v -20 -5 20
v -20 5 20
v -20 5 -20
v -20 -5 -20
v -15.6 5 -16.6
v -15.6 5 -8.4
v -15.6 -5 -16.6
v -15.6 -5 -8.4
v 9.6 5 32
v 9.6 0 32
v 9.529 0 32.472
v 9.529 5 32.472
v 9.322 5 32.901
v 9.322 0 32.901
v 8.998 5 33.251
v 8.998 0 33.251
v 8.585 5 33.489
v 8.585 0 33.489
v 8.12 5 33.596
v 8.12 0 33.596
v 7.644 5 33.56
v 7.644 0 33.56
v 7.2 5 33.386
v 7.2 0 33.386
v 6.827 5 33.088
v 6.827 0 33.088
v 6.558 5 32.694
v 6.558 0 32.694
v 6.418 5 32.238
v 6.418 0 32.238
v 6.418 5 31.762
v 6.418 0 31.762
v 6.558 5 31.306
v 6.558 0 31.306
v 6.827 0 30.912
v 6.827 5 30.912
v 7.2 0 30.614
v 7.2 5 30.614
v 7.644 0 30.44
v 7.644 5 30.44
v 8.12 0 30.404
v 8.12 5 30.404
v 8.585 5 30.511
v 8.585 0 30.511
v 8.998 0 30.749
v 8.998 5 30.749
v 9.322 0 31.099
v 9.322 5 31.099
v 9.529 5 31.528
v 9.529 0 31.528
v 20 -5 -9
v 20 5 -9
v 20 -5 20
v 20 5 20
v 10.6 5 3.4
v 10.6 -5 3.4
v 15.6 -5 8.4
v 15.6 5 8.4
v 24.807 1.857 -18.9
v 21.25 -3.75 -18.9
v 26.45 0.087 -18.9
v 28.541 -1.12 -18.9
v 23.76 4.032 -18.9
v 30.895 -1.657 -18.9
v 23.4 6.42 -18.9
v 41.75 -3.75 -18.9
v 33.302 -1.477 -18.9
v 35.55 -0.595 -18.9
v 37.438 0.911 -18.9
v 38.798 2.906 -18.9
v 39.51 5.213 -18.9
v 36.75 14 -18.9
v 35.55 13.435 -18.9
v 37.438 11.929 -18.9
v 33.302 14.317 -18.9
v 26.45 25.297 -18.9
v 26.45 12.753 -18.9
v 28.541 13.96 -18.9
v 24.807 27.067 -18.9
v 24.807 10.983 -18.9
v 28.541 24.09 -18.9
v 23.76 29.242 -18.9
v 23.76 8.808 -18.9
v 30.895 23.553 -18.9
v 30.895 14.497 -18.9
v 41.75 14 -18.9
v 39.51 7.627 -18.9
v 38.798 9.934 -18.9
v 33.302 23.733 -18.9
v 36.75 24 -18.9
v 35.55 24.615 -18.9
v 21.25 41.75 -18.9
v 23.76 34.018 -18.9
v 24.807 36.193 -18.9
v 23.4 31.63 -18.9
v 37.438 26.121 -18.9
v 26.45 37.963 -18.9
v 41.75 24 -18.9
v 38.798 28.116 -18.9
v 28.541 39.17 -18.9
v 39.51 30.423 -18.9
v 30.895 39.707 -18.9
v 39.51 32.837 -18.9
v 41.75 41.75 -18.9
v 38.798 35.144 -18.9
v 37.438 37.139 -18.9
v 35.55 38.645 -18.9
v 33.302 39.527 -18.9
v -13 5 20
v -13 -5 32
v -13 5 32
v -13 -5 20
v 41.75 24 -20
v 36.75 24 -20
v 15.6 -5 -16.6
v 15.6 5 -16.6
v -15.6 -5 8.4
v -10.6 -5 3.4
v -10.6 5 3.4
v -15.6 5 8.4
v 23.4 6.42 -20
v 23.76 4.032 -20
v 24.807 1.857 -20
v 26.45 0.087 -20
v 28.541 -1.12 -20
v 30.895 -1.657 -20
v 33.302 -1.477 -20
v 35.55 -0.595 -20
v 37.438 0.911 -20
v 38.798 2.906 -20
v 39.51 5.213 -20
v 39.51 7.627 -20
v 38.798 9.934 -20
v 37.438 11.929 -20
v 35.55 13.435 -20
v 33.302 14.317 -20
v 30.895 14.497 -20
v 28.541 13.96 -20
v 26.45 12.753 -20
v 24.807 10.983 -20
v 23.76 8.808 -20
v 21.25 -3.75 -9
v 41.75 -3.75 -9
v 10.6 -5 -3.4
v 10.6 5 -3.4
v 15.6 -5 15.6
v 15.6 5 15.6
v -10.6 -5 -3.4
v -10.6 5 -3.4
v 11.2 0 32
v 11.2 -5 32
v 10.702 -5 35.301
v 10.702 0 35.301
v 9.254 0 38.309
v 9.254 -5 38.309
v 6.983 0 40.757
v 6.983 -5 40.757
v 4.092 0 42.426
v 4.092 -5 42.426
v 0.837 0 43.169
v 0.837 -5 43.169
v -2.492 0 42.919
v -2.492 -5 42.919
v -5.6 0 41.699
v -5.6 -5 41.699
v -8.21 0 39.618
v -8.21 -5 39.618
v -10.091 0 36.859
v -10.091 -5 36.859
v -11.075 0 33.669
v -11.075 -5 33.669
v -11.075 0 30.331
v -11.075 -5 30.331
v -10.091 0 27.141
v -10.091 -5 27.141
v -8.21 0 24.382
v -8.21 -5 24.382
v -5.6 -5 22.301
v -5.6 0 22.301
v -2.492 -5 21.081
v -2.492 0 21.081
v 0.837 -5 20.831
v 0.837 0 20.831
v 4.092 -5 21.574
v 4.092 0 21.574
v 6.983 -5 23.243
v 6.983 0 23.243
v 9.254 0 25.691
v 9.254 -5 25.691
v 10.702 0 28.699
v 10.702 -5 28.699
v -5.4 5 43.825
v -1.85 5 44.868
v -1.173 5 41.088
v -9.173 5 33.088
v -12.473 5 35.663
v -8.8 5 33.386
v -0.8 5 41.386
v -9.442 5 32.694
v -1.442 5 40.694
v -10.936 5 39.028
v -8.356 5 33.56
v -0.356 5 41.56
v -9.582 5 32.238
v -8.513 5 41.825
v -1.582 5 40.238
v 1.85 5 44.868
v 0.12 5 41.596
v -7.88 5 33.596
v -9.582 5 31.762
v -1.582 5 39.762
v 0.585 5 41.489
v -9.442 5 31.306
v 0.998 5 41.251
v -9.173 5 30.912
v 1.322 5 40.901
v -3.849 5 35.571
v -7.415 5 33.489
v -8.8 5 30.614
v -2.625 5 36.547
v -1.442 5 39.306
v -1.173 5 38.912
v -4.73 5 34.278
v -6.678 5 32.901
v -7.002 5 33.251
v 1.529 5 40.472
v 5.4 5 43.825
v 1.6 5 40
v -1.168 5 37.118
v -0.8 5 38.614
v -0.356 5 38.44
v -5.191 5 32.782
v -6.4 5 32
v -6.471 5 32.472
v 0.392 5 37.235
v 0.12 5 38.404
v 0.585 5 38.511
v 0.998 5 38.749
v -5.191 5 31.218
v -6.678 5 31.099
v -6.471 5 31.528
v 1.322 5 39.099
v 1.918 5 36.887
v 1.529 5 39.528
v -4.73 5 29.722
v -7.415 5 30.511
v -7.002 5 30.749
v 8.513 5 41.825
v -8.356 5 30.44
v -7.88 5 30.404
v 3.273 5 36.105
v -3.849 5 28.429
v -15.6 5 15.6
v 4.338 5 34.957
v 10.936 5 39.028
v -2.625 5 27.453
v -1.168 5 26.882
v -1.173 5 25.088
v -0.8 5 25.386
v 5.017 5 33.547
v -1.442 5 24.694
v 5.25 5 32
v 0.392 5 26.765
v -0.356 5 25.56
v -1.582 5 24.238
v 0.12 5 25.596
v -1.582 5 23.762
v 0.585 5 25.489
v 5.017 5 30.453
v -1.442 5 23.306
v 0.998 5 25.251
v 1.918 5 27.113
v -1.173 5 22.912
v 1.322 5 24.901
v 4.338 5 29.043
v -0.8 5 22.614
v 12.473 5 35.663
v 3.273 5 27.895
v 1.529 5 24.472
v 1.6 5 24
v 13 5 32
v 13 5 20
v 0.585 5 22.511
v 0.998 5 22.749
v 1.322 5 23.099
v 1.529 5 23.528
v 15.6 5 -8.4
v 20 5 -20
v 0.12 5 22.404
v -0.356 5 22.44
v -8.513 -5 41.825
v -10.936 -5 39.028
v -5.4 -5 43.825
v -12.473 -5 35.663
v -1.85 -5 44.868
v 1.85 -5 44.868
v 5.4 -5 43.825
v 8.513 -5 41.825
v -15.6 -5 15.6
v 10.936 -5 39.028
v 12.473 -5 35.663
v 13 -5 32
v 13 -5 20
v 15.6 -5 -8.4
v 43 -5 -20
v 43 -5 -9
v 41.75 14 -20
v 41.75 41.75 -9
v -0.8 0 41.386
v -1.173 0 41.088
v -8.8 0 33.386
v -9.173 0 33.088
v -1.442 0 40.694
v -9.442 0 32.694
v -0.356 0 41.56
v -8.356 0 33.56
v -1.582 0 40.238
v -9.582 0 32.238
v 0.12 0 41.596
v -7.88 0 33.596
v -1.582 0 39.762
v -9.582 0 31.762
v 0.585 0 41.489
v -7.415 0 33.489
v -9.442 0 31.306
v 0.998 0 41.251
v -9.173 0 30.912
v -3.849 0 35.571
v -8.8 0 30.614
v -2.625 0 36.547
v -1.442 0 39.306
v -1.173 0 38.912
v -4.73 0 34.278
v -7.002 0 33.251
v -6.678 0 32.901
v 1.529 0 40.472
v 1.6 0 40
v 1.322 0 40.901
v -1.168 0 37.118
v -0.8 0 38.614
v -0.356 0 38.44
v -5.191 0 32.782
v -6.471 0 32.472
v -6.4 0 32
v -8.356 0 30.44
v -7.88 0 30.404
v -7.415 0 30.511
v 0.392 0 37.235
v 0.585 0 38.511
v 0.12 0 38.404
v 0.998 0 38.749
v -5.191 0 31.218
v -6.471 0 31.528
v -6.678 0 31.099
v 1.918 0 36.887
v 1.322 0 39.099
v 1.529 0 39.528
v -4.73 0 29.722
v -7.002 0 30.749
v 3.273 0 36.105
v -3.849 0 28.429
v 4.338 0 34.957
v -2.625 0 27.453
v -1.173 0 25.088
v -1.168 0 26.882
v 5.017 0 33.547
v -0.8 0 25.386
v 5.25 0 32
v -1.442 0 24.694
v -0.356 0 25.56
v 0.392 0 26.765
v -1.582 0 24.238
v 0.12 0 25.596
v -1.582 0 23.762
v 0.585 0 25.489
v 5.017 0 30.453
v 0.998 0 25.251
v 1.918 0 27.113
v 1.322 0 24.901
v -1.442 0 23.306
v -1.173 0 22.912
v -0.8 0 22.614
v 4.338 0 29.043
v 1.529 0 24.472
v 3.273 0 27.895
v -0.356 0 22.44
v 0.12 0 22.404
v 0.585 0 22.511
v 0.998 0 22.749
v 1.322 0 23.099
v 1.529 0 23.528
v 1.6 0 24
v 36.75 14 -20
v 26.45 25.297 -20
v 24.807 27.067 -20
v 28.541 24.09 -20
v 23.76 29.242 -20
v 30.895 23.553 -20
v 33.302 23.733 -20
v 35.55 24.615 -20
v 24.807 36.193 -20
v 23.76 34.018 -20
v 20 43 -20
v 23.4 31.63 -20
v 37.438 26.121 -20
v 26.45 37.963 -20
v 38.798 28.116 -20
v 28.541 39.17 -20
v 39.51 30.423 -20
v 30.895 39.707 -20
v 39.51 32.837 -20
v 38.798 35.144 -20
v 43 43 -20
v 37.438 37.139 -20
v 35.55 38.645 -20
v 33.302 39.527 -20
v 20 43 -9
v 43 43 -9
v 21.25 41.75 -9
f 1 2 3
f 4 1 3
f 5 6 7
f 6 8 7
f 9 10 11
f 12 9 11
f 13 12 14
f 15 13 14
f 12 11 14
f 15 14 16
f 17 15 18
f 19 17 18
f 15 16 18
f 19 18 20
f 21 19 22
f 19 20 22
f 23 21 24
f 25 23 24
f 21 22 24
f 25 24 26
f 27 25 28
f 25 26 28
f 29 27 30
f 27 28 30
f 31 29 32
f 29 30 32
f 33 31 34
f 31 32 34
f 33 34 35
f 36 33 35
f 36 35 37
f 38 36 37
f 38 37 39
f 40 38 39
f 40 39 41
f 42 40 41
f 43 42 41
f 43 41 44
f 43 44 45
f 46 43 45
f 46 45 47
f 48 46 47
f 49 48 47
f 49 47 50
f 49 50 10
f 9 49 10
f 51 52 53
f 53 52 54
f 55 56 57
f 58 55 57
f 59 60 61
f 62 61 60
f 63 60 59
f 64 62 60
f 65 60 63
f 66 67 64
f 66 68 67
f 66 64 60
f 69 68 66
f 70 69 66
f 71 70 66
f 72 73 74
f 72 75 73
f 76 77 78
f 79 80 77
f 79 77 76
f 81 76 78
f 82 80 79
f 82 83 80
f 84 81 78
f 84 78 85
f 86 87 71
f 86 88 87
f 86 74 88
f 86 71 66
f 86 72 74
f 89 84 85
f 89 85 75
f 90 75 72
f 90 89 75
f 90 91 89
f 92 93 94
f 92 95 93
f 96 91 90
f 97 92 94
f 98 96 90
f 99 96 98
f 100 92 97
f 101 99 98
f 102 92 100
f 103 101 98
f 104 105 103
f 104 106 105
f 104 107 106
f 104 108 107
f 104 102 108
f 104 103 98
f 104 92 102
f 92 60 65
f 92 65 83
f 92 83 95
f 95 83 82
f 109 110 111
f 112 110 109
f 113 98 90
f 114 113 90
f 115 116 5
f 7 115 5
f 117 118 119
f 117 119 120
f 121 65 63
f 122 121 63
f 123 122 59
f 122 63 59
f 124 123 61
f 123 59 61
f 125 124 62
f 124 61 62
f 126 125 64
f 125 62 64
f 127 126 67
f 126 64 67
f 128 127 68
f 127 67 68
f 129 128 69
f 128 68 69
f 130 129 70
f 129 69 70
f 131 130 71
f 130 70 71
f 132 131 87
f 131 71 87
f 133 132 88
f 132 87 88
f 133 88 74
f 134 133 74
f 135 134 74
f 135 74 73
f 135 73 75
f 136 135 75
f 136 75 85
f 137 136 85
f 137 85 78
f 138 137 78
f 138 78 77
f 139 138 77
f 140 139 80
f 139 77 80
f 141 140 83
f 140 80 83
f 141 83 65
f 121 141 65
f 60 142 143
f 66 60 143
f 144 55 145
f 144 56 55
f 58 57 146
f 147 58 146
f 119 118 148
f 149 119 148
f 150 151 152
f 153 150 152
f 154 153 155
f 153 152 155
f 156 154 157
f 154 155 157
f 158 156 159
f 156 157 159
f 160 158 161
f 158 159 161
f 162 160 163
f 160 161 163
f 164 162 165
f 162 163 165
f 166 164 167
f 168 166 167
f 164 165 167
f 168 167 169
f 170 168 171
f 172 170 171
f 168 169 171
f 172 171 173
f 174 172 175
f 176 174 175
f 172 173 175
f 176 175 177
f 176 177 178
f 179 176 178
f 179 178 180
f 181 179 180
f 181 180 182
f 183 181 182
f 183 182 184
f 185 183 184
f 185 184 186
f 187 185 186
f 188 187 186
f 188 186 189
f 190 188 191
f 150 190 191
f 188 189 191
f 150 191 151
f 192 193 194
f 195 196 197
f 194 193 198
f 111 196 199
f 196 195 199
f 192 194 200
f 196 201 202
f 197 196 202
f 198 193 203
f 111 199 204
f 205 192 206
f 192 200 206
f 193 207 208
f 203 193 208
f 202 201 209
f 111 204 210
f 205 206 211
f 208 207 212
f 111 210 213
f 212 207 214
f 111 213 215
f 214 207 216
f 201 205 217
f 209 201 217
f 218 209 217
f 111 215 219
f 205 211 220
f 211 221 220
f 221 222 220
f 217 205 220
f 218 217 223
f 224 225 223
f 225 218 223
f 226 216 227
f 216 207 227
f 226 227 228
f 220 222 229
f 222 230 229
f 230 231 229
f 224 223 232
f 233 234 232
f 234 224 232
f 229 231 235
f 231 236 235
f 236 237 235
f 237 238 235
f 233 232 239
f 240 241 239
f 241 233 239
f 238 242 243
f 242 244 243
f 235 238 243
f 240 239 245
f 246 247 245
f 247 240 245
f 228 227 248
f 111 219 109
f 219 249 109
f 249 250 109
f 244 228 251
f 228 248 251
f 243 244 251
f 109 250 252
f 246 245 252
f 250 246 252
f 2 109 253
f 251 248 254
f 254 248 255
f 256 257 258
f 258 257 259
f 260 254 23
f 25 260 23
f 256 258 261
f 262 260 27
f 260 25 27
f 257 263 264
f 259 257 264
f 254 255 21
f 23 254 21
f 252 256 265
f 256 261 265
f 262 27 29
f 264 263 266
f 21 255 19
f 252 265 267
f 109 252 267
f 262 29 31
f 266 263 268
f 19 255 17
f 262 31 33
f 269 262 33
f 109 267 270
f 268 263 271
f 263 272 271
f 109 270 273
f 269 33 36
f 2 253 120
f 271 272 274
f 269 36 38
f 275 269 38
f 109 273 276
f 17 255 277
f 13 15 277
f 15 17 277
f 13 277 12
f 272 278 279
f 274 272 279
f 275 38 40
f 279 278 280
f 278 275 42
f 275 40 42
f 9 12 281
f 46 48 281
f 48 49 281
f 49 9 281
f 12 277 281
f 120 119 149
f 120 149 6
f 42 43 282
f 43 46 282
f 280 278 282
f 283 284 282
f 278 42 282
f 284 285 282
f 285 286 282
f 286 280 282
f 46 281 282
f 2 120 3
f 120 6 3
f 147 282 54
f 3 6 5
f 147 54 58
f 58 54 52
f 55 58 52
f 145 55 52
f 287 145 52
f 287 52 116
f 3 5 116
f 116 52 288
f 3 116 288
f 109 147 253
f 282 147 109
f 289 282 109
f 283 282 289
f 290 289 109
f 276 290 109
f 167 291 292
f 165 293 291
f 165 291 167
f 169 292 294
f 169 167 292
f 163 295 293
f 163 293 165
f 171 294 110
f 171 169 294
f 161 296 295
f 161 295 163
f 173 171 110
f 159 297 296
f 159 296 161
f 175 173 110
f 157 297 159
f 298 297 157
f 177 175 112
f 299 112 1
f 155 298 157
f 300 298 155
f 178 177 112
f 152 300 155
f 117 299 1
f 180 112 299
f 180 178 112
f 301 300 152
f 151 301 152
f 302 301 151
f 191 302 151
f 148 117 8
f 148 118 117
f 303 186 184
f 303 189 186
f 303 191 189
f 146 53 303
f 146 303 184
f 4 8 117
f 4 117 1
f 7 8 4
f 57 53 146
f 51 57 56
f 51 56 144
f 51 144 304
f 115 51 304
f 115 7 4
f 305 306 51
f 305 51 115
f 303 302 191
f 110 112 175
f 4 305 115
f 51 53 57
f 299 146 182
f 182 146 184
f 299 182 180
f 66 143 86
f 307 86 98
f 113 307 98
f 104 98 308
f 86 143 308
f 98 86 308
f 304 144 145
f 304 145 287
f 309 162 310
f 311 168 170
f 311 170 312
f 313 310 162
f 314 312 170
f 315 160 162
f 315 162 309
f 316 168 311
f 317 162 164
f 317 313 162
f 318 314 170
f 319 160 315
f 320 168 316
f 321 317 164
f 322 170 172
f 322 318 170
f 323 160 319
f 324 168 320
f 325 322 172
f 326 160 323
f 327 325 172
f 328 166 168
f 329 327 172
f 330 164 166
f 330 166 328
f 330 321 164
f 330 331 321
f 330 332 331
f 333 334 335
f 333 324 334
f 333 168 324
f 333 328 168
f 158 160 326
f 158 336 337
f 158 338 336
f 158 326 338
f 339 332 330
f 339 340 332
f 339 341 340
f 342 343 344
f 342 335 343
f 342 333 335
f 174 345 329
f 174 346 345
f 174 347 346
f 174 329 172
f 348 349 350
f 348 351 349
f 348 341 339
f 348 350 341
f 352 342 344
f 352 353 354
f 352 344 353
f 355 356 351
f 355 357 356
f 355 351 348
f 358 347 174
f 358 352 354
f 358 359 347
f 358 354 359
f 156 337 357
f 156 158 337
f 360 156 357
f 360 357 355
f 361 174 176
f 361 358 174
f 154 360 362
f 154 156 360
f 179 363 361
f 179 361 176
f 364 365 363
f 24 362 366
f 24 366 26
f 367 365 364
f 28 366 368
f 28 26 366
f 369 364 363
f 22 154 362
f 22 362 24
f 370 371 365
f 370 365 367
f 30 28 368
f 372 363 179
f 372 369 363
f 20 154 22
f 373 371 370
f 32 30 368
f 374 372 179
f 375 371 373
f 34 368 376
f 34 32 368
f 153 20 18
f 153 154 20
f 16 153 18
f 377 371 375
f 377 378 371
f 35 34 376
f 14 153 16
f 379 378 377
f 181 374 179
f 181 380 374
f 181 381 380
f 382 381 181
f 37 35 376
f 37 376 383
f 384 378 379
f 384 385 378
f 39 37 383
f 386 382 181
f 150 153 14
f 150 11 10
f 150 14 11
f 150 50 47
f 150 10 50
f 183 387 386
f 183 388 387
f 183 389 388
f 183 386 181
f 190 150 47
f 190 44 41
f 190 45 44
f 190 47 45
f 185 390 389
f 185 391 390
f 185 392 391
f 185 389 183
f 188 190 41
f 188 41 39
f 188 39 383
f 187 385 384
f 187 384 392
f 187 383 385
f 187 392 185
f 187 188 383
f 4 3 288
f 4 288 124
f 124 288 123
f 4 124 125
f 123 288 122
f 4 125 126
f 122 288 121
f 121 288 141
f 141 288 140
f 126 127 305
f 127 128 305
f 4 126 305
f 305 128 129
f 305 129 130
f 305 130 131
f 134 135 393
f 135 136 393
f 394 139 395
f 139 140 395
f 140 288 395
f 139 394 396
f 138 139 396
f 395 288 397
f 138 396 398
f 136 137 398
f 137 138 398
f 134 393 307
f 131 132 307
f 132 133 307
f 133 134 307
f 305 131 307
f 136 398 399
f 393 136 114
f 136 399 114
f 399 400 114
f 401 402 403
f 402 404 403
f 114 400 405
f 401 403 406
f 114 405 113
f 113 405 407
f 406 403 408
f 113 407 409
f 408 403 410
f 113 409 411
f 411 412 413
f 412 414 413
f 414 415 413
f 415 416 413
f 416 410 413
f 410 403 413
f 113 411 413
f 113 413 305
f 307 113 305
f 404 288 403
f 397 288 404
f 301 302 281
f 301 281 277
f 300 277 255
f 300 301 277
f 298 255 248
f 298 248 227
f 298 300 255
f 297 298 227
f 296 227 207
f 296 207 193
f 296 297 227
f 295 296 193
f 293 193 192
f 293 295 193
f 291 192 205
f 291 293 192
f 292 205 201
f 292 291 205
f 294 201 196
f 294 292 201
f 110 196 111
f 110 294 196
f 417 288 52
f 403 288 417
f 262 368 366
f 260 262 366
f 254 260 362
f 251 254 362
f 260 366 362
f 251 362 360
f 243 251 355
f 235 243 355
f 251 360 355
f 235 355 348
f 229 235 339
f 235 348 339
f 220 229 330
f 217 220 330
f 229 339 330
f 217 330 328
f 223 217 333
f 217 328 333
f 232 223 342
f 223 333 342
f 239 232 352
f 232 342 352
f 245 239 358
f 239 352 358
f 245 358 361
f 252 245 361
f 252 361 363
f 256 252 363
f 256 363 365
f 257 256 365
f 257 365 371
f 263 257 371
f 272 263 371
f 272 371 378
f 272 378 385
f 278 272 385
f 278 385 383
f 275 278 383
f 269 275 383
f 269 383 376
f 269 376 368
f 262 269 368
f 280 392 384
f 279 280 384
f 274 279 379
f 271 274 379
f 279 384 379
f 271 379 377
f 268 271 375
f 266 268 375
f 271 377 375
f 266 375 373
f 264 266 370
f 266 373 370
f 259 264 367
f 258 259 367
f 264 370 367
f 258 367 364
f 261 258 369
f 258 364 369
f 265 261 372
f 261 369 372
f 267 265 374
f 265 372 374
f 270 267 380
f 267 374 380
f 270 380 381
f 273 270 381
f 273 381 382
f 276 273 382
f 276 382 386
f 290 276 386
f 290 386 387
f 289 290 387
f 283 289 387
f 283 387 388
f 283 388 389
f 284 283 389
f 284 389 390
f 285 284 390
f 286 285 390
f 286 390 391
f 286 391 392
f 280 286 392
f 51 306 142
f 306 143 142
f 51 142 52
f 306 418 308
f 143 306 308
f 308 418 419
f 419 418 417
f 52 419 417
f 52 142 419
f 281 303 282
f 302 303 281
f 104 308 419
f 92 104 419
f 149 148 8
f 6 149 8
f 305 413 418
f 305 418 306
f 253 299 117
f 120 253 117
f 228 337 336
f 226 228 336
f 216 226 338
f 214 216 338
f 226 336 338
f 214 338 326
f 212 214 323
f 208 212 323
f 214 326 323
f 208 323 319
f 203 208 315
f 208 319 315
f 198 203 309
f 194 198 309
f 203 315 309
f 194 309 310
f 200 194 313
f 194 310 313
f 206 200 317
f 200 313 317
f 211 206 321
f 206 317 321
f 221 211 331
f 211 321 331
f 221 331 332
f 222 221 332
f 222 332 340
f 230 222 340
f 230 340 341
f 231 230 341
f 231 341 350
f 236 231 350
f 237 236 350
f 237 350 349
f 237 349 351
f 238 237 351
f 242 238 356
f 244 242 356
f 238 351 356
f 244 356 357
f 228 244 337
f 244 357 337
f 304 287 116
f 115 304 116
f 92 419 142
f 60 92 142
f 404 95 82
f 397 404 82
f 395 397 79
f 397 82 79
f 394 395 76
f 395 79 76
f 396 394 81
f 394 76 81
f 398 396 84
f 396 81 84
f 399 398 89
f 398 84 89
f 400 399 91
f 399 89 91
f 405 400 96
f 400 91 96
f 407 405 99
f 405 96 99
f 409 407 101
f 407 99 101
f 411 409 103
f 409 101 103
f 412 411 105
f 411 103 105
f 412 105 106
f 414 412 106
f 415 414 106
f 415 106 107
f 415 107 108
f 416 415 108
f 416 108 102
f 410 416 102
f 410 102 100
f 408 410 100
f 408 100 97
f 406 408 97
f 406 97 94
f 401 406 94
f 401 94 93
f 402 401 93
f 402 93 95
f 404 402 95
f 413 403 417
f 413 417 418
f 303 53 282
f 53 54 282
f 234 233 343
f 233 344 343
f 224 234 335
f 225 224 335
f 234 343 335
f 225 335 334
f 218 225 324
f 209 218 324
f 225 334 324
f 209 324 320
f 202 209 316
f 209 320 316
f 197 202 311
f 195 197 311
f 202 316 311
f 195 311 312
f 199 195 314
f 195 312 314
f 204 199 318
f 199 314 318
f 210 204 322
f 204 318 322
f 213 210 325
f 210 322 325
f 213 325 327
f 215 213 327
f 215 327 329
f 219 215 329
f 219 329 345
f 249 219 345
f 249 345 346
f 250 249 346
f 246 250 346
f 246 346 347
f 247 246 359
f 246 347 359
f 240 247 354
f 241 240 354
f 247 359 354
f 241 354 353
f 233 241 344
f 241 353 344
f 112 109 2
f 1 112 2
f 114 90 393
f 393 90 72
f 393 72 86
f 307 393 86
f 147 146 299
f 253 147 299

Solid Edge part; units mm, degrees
sketch "Sketch1" plane through (0, 0, 0) normal (0, -1, 0) x (1, 0, 0)
  line L0 (-20, -20) -> (20, -20)
  line L1 (20, -20) -> (20, 20)
  line L2 (20, 20) -> (-20, 20)
  line L3 (-20, 20) -> (-20, -20)
extrude "Protrusion1" add sketch "Sketch1" along normal mid plane 10
sketch "Sketch2" plane through (0, -5, 0) normal (0, -1, 0) x (1, 0, 0)
  line L0 (-10.6, 3.4) -> (-15.6, 8.4)
  line L1 (-15.6, 15.6) -> (-15.6, 8.4)
  line L2 (15.6, 15.6) -> (-15.6, 15.6)
  line L3 (15.6, 8.4) -> (15.6, 15.6)
  line L4 (10.6, 3.4) -> (15.6, 8.4)
  line L5 (10.6, 3.4) -> (10.6, -3.4)
  line L6 (10.6, -3.4) -> (15.6, -8.4)
  line L7 (15.6, -15.6) -> (15.6, -8.4)
  line L8 (-15.6, -15.6) -> (15.6, -15.6)
  line L9 (-15.6, -8.4) -> (-15.6, -15.6)
  line L10 (-10.6, -3.4) -> (-15.6, -8.4)
  line L11 (-10.6, 3.4) -> (-10.6, -3.4)
  dimension "D1" = 5
  dimension "D2" = 3.4
extrude "Cutout1" cut sketch "Sketch2" against normal through all
sketch "Sketch3" plane through (0, -5, 0) normal (0, -1, 0) x (1, 0, 0)
  line L0 (-13, 32) -> (-13, 20)
  line L1 (-13, 20) -> (13, 20)
  line L2 (13, 20) -> (13, 32)
  arc A0 (13, 32) -> (-13, 32) centre (0, 32) ccw
extrude "ExtrudedProtrusion_2" add sketch "Sketch3" against normal blind 10
sketch "Sketch4" plane through (0, -5, 12.25) normal (0, -1, 0) x (1, 0, 0)
  circle A0 centre (0, 19.75) radius 11.2
extrude "ExtrudedCutout_2" cut sketch "Sketch4" against normal blind 5
sketch "Sketch5" plane through (0, 0, 32) normal (0, -1, 0) x (1, 0, 0)
  circle A0 centre (0, 0) radius 5.25
  circle A1 centre (0, 8) radius 1.6
  circle A2 centre (-8, 0) radius 1.6
  circle A3 centre (0, -8) radius 1.6
  circle A4 centre (8, 0) radius 1.6
  dimension "D1" = 8
  dimension "D2" = 8
extrude "Cutout2" cut sketch "Sketch5" against normal up to next
sketch "Sketch6" plane through (0, 5, 12.25) normal (0, 1, 0) x (-1, 0, 0)
  line L0 (-15.6, -27.85) -> (-15.6, -28.85)
  line L1 (-15.6, -28.85) -> (15.6, -28.85)
  line L2 (15.6, -28.85) -> (15.6, -27.85)
  line L3 (15.6, -27.85) -> (-15.6, -27.85)
extrude "ExtrudedCutout_12" cut sketch "Sketch6" against normal blind 209
sketch "Sketch7" plane through (0, 0, -20) normal (0, 0, -1) x (0, 1, 0)
  line L0 (-5, 20) -> (43, 20)
  line L1 (43, 20) -> (43, 43)
  line L2 (43, 43) -> (-5, 43)
  line L3 (-5, 43) -> (-5, 20)
extrude "ExtrudedProtrusion_7" add sketch "Sketch7" against normal blind 11
sketch "Sketch8" plane through (31.5, 19, -9) normal (0, 0, 1) x (-1, 0, 0)
  line L0 (-10.25, -22.75) -> (10.25, -22.75)
  line L1 (10.25, -22.75) -> (10.25, 22.75)
  line L2 (10.25, 22.75) -> (-10.25, 22.75)
  line L3 (-10.25, 22.75) -> (-10.25, -22.75)
extrude "ExtrudedCutout_17" cut sketch "Sketch8" against normal blind 9.9
sketch "Sketch9" plane through (31.5, 19, -18.9) normal (0, 0, 1) x (-1, 0, 0)
  circle A0 centre (0, 12.58) radius 8.1
  circle A1 centre (0, -12.63) radius 8.1
  line L0 (-10.25, 5) -> (-10.25, -5)
  line L1 (-10.25, -5) -> (-5.25, -5)
  line L2 (-5.25, -5) -> (-5.25, 5)
  line L3 (-5.25, 5) -> (-10.25, 5)
  dimension "D1" = 10.17
  dimension "D2" = 10.12
  dimension "D3" = 5
extrude "Cutout3" cut sketch "Sketch9" against normal up to next
